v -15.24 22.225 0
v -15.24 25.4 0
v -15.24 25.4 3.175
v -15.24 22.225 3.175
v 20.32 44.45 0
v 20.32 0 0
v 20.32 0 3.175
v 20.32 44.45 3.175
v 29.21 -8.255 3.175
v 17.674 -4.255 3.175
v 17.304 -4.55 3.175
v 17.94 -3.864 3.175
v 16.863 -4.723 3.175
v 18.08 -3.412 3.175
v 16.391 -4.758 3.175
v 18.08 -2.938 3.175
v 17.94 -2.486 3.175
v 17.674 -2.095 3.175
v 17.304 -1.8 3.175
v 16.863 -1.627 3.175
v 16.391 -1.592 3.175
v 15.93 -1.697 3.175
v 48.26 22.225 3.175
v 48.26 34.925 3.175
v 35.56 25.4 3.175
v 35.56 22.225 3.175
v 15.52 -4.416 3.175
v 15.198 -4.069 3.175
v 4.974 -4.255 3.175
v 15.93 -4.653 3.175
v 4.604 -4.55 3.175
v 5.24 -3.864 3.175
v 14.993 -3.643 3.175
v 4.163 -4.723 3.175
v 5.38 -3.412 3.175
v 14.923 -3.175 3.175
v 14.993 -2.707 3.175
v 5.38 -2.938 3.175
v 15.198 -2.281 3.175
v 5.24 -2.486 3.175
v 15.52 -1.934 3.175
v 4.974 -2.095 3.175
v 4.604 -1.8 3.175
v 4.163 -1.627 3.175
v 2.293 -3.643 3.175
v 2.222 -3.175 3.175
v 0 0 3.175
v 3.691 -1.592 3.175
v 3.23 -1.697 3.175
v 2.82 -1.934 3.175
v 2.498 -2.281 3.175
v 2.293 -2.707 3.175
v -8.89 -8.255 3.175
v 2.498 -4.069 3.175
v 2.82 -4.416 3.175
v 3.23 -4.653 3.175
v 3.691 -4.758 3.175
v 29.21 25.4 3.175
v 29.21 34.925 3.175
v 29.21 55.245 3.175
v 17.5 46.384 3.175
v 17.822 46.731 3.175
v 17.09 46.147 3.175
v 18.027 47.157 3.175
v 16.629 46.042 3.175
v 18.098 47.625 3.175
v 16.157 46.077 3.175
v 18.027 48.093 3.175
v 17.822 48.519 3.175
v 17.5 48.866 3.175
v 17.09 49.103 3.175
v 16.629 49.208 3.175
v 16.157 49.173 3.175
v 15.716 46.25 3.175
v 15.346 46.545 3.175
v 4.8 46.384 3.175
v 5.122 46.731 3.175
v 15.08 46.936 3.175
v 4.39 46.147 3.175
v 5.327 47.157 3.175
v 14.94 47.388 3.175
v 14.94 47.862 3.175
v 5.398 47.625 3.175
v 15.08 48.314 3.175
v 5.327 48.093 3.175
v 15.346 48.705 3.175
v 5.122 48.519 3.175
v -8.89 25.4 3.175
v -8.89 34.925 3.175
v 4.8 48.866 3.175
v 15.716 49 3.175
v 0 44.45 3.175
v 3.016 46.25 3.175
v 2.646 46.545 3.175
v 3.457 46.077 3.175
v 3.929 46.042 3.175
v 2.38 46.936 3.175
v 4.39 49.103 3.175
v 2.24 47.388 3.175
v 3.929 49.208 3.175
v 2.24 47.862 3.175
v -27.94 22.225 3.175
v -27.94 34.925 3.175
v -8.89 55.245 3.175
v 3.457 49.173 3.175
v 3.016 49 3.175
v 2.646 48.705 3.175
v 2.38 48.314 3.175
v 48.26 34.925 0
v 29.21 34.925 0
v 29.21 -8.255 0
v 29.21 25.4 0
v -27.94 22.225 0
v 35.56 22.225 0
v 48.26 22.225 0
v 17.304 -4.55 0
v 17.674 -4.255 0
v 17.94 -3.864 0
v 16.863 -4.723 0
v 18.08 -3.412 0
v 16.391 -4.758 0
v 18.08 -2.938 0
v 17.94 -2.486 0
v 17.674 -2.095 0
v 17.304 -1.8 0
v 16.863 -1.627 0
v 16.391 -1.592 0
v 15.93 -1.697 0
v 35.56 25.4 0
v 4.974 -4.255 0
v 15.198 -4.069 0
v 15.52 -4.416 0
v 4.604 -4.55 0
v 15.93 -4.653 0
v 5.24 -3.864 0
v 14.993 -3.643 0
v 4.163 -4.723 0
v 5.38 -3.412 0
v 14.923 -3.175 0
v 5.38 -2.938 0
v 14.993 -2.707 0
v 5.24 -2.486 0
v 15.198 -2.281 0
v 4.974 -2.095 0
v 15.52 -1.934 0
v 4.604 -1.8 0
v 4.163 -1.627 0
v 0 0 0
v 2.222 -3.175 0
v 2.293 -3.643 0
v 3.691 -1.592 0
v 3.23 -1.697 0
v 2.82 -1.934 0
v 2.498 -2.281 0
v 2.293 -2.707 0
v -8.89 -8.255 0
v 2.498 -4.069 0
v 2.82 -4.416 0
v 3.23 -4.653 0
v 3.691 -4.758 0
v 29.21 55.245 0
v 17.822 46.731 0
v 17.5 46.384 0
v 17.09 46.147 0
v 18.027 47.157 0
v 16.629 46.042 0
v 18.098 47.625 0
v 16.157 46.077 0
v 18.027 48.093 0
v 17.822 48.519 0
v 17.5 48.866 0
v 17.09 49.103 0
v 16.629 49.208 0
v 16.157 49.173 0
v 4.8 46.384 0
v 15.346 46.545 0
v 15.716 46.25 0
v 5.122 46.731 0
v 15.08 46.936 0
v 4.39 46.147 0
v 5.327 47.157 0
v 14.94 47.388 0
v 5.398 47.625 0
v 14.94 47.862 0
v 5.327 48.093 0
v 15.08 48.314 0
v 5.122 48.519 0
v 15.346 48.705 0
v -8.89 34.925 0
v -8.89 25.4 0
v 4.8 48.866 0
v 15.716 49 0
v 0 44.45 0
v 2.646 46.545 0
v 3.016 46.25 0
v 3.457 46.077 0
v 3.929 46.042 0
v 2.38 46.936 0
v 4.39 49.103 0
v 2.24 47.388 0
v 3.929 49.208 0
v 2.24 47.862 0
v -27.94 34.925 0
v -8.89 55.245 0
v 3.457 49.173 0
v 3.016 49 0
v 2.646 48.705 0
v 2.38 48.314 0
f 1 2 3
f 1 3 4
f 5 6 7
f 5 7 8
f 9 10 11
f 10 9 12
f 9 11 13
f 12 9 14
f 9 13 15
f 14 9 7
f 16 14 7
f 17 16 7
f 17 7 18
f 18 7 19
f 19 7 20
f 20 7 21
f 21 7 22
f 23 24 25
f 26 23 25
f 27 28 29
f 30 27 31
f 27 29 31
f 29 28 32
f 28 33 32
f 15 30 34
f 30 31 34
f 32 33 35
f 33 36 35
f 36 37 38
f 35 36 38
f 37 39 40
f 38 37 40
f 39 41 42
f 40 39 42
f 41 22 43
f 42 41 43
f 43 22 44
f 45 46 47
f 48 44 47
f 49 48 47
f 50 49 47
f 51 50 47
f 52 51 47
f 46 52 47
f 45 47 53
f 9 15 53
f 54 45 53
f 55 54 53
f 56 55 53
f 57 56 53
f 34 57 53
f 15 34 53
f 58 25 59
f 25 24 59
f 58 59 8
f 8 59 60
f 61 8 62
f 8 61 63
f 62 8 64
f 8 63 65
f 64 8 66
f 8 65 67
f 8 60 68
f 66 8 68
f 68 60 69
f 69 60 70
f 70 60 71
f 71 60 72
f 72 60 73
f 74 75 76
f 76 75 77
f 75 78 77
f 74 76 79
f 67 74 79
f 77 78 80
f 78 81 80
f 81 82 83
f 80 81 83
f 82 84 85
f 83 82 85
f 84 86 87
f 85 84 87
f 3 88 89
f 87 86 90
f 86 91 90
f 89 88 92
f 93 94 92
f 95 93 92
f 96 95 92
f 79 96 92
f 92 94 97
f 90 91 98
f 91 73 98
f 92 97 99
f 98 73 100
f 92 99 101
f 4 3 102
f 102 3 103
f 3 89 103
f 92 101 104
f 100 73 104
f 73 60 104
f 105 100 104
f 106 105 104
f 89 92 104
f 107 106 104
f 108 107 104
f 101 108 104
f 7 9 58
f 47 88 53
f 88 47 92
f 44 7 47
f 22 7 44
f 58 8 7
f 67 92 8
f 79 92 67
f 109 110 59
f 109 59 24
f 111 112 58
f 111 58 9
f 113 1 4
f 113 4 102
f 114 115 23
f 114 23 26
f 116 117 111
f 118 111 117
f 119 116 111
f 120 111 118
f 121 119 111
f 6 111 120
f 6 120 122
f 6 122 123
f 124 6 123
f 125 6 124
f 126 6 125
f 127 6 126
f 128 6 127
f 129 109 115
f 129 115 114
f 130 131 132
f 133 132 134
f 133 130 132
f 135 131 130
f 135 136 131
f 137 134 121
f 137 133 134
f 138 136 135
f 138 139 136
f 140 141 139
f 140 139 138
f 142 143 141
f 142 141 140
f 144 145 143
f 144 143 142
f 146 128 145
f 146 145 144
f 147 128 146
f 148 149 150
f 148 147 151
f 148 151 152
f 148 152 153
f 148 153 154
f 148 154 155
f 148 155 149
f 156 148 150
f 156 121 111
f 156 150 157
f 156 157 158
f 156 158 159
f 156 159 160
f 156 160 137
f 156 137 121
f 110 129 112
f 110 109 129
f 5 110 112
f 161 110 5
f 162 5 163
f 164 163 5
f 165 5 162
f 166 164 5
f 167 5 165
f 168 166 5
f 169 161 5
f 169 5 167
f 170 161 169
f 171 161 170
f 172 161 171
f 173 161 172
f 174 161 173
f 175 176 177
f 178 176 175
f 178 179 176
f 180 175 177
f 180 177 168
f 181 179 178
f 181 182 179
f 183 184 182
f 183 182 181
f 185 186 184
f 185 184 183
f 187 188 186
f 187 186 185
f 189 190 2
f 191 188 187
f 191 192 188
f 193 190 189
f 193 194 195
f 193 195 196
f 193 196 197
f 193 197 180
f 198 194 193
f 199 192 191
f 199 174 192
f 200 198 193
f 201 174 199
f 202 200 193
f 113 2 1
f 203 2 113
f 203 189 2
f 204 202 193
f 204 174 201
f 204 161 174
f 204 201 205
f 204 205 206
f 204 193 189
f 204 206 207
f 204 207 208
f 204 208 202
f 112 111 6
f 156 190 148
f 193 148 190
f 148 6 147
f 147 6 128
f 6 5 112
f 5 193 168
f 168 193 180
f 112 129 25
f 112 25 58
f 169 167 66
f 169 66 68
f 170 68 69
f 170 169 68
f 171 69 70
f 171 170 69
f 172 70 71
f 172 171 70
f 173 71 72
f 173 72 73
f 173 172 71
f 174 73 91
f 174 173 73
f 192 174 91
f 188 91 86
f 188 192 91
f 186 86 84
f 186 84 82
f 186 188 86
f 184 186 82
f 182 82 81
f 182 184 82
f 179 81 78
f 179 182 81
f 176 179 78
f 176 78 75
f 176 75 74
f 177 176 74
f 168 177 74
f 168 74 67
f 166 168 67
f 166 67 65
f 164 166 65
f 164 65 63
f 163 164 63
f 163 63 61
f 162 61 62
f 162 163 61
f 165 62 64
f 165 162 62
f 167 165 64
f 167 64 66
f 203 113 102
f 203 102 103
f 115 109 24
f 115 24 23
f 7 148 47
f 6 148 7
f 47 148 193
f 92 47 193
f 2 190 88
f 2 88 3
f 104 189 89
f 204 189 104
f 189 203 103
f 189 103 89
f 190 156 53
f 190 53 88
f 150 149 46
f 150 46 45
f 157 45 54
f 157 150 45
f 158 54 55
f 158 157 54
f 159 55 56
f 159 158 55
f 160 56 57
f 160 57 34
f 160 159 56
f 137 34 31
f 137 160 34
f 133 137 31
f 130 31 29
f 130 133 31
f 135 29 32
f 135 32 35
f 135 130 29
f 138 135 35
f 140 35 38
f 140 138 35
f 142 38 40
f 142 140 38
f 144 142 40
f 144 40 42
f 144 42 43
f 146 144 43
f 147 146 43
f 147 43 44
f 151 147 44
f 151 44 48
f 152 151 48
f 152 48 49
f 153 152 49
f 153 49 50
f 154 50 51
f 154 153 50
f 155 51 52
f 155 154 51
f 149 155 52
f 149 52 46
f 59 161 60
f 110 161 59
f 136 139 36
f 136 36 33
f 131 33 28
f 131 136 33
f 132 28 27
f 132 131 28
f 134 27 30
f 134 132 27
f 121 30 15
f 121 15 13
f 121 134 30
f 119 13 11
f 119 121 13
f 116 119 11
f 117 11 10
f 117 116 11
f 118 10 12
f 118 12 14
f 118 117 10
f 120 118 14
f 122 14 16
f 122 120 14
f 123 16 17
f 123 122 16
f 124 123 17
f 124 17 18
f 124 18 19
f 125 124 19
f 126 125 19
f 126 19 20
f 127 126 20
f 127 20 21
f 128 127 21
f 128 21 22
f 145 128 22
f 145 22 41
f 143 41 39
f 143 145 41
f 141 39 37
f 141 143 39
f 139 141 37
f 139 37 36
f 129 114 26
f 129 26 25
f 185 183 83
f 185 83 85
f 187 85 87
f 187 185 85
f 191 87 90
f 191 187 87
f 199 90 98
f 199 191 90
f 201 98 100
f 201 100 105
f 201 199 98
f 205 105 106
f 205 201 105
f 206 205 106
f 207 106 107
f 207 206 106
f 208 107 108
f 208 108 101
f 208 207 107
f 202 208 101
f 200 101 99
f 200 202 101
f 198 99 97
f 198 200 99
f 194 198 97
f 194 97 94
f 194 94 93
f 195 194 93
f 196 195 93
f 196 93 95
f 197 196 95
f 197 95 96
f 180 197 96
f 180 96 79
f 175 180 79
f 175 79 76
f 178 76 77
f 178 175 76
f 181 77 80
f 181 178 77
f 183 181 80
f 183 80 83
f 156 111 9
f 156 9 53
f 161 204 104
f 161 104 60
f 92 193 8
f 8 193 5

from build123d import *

# Parameters (mm, degrees)
SKETCH1_R           = 1.5875
SKETCH1_W           = 20.32
SKETCH1_H           = 44.45
BOSS_EXTRUDE1_DEPTH = 3.175


with BuildPart() as part:
    # Sketch1 → Boss-Extrude1 (new body)
    with BuildSketch(Plane.XY):
        Polygon((-8.89, 25.4), (-15.24, 25.4), (-15.24, 22.225), (-27.94, 22.225), (-27.94, 34.925), (-8.89, 34.925), (-8.89, 55.245), (29.21, 55.245), (29.21, 34.925), (48.26, 34.925), (48.26, 22.225), (35.56, 22.225), (35.56, 25.4), (29.21, 25.4), (29.21, -8.255), (-8.89, -8.255), align=None)
        with Locations((3.81, 47.625)):
            Circle(SKETCH1_R, mode=Mode.SUBTRACT)
        with Locations((16.51, 47.625)):
            Circle(SKETCH1_R, mode=Mode.SUBTRACT)
        with Locations(Location((16.51, -3.175, 0), (0, 0, 180))):
            Circle(SKETCH1_R, mode=Mode.SUBTRACT)
        with Locations(Location((3.81, -3.175, 0), (0, 0, 180))):
            Circle(SKETCH1_R, mode=Mode.SUBTRACT)
        with Locations((10.16, 22.225)):
            Rectangle(SKETCH1_W, SKETCH1_H, mode=Mode.SUBTRACT)
    extrude(amount=BOSS_EXTRUDE1_DEPTH)


solid = part.part
